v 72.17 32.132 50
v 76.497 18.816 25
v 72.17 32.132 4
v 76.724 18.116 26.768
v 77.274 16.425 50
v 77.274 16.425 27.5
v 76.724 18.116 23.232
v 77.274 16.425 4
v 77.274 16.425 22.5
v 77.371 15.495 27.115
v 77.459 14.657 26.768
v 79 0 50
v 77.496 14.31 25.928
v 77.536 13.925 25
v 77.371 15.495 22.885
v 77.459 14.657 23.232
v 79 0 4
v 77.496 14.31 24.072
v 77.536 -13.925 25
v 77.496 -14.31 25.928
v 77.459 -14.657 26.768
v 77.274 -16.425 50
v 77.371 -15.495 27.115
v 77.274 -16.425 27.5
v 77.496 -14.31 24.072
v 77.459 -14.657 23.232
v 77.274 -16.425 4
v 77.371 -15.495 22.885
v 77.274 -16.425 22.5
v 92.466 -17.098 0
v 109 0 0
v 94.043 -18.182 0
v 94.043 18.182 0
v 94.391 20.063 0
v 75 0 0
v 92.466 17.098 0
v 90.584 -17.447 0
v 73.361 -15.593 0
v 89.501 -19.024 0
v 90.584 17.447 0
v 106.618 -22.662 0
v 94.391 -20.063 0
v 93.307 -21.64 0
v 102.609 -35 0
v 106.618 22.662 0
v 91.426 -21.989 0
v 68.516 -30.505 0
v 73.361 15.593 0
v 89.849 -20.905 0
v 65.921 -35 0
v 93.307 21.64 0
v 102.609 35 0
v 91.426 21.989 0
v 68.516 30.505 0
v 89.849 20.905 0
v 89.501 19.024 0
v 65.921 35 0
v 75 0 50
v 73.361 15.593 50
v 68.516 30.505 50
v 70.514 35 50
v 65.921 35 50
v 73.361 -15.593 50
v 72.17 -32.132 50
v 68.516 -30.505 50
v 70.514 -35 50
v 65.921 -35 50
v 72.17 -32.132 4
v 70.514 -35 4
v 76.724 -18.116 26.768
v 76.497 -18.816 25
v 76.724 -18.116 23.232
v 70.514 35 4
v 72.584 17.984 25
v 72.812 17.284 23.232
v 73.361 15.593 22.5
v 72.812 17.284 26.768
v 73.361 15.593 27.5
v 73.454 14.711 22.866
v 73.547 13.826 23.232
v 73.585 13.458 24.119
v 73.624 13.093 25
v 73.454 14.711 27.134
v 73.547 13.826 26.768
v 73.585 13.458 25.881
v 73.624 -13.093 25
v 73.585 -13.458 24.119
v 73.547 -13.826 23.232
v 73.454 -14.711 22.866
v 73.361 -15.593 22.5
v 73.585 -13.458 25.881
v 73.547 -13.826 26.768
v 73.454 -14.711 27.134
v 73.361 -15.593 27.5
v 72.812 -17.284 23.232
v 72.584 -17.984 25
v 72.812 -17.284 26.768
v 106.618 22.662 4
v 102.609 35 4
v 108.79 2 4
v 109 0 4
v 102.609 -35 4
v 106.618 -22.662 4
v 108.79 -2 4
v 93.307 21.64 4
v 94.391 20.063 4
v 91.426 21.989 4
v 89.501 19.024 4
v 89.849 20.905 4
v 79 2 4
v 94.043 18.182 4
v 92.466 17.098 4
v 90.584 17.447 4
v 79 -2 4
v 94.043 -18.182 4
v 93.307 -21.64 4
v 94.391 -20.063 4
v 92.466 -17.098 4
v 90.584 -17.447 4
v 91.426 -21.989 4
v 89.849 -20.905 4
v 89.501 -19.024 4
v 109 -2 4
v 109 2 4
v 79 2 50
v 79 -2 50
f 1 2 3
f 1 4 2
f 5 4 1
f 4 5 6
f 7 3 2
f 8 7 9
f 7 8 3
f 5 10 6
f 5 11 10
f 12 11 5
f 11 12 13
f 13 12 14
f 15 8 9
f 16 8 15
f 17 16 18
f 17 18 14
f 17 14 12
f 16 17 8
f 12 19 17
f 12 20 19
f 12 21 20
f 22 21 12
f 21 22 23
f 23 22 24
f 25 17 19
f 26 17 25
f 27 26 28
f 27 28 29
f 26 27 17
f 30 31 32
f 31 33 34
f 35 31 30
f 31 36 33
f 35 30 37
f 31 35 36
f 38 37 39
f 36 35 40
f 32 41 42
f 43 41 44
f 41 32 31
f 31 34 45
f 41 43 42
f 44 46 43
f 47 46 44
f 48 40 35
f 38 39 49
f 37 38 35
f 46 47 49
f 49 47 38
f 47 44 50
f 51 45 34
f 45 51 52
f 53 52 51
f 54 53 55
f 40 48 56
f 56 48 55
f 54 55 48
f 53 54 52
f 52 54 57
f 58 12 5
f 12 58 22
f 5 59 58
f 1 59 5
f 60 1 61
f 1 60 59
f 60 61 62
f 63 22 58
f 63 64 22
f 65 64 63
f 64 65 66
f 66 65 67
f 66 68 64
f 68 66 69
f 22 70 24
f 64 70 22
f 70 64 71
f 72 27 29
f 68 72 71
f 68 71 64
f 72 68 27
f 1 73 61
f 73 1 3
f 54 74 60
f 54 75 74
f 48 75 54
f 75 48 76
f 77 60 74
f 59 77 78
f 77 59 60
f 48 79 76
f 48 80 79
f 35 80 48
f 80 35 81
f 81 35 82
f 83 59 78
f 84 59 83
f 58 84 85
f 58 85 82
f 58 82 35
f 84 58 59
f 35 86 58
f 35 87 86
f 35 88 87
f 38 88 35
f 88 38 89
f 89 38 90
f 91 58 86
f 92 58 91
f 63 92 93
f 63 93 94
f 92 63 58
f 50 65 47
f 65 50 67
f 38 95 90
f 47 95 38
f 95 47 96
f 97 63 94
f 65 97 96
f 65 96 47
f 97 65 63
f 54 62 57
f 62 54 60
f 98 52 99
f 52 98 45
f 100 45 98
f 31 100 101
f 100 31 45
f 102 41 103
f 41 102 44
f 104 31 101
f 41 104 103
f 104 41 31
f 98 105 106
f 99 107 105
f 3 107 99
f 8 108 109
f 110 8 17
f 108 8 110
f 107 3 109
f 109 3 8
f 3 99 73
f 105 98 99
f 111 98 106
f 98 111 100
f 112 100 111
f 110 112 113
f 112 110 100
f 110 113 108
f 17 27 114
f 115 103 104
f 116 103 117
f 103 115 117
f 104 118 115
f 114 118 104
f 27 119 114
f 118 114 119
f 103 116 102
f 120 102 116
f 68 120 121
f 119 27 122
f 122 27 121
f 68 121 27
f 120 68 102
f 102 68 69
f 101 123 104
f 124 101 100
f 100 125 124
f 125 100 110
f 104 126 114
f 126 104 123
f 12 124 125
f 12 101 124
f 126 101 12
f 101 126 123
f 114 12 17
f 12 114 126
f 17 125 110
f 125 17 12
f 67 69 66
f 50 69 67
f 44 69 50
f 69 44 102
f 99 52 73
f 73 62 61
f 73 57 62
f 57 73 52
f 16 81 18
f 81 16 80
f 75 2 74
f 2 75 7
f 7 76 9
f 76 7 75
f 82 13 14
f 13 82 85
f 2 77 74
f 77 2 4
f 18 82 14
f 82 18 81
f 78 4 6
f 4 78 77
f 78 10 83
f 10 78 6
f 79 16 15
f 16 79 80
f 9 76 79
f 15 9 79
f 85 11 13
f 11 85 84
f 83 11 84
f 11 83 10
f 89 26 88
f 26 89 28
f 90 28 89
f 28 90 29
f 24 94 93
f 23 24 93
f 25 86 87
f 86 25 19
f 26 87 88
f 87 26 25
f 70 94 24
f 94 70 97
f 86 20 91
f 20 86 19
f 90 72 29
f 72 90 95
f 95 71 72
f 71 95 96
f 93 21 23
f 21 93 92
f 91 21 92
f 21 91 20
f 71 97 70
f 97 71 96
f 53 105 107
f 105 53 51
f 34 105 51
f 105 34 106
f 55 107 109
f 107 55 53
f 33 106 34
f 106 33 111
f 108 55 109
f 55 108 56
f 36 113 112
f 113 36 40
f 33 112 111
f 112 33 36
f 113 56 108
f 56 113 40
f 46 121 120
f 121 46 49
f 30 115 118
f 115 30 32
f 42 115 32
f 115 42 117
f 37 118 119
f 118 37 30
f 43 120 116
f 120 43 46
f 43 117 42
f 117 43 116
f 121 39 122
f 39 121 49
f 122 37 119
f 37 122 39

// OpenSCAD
dia_couronne=150;
hauteur_couronne=50;
epaisseur=4;
largeur_base=30;
longueur=70;
dia_trous=5;
angle_trous=12;

module rond()
{
	difference()
	{
		cylinder(d=dia_couronne+2*epaisseur,h=hauteur_couronne);
		cylinder(d=dia_couronne,h=hauteur_couronne);
	}
}

module base()
{
	difference()
	{
		cylinder(d=dia_couronne+2*epaisseur+2*largeur_base,h=epaisseur);
		cylinder(d=dia_couronne+2*epaisseur,h=hauteur_couronne);
	}
}

module renfort(angle)
{
	rotate([0,0,angle])
		translate([dia_couronne/2+epaisseur,epaisseur/2,epaisseur])
			rotate([90,0,0])
				linear_extrude(epaisseur)
					polygon([[0,0],[largeur_base,0],[0,hauteur_couronne-epaisseur]]);
}

module support()
{
	difference()
	{
		union()
		{
			rond();
			base();
			renfort(0);
		}
		translate([0,-longueur/2-(dia_couronne/2+largeur_base+epaisseur+0.2)/2,0])
			cube([dia_couronne+2*largeur_base+2*epaisseur+0.2,dia_couronne/2+largeur_base+epaisseur+0.2,2*hauteur_couronne+0.2],center=true);
	translate([0,+longueur/2+(dia_couronne/2+largeur_base+epaisseur+0.2)/2,0])
			cube([dia_couronne+2*largeur_base+2*epaisseur+0.2,dia_couronne/2+largeur_base+epaisseur+0.2,2*hauteur_couronne+0.2],center=true);
	translate([-(dia_couronne/2+largeur_base+epaisseur)/2-0.1,0,0])
			cube([dia_couronne/2+largeur_base+epaisseur+0.2,longueur+0.2,2*hauteur_couronne+0.2],center=true);
	}
}

module trous()
{
	//sur la couronne
	rotate([0,0,angle_trous])
		translate([0,0,hauteur_couronne/2])
			rotate([0,90,0])
				cylinder(d=dia_trous,h=dia_couronne);
	rotate([0,0,-angle_trous])
		translate([0,0,hauteur_couronne/2])
			rotate([0,90,0])
				cylinder(d=dia_trous,h=dia_couronne);
	//sur la base
	rotate([0,0,angle_trous])
		translate([dia_couronne/2+epaisseur+largeur_base/2,0,-0.1])
			cylinder(d=dia_trous,h=epaisseur+0.2);
	rotate([0,0,-angle_trous])
		translate([dia_couronne/2+epaisseur+largeur_base/2,0,-0.1])
			cylinder(d=dia_trous,h=epaisseur+0.2);
	
}

difference()
{
	support();
	trous();
}
